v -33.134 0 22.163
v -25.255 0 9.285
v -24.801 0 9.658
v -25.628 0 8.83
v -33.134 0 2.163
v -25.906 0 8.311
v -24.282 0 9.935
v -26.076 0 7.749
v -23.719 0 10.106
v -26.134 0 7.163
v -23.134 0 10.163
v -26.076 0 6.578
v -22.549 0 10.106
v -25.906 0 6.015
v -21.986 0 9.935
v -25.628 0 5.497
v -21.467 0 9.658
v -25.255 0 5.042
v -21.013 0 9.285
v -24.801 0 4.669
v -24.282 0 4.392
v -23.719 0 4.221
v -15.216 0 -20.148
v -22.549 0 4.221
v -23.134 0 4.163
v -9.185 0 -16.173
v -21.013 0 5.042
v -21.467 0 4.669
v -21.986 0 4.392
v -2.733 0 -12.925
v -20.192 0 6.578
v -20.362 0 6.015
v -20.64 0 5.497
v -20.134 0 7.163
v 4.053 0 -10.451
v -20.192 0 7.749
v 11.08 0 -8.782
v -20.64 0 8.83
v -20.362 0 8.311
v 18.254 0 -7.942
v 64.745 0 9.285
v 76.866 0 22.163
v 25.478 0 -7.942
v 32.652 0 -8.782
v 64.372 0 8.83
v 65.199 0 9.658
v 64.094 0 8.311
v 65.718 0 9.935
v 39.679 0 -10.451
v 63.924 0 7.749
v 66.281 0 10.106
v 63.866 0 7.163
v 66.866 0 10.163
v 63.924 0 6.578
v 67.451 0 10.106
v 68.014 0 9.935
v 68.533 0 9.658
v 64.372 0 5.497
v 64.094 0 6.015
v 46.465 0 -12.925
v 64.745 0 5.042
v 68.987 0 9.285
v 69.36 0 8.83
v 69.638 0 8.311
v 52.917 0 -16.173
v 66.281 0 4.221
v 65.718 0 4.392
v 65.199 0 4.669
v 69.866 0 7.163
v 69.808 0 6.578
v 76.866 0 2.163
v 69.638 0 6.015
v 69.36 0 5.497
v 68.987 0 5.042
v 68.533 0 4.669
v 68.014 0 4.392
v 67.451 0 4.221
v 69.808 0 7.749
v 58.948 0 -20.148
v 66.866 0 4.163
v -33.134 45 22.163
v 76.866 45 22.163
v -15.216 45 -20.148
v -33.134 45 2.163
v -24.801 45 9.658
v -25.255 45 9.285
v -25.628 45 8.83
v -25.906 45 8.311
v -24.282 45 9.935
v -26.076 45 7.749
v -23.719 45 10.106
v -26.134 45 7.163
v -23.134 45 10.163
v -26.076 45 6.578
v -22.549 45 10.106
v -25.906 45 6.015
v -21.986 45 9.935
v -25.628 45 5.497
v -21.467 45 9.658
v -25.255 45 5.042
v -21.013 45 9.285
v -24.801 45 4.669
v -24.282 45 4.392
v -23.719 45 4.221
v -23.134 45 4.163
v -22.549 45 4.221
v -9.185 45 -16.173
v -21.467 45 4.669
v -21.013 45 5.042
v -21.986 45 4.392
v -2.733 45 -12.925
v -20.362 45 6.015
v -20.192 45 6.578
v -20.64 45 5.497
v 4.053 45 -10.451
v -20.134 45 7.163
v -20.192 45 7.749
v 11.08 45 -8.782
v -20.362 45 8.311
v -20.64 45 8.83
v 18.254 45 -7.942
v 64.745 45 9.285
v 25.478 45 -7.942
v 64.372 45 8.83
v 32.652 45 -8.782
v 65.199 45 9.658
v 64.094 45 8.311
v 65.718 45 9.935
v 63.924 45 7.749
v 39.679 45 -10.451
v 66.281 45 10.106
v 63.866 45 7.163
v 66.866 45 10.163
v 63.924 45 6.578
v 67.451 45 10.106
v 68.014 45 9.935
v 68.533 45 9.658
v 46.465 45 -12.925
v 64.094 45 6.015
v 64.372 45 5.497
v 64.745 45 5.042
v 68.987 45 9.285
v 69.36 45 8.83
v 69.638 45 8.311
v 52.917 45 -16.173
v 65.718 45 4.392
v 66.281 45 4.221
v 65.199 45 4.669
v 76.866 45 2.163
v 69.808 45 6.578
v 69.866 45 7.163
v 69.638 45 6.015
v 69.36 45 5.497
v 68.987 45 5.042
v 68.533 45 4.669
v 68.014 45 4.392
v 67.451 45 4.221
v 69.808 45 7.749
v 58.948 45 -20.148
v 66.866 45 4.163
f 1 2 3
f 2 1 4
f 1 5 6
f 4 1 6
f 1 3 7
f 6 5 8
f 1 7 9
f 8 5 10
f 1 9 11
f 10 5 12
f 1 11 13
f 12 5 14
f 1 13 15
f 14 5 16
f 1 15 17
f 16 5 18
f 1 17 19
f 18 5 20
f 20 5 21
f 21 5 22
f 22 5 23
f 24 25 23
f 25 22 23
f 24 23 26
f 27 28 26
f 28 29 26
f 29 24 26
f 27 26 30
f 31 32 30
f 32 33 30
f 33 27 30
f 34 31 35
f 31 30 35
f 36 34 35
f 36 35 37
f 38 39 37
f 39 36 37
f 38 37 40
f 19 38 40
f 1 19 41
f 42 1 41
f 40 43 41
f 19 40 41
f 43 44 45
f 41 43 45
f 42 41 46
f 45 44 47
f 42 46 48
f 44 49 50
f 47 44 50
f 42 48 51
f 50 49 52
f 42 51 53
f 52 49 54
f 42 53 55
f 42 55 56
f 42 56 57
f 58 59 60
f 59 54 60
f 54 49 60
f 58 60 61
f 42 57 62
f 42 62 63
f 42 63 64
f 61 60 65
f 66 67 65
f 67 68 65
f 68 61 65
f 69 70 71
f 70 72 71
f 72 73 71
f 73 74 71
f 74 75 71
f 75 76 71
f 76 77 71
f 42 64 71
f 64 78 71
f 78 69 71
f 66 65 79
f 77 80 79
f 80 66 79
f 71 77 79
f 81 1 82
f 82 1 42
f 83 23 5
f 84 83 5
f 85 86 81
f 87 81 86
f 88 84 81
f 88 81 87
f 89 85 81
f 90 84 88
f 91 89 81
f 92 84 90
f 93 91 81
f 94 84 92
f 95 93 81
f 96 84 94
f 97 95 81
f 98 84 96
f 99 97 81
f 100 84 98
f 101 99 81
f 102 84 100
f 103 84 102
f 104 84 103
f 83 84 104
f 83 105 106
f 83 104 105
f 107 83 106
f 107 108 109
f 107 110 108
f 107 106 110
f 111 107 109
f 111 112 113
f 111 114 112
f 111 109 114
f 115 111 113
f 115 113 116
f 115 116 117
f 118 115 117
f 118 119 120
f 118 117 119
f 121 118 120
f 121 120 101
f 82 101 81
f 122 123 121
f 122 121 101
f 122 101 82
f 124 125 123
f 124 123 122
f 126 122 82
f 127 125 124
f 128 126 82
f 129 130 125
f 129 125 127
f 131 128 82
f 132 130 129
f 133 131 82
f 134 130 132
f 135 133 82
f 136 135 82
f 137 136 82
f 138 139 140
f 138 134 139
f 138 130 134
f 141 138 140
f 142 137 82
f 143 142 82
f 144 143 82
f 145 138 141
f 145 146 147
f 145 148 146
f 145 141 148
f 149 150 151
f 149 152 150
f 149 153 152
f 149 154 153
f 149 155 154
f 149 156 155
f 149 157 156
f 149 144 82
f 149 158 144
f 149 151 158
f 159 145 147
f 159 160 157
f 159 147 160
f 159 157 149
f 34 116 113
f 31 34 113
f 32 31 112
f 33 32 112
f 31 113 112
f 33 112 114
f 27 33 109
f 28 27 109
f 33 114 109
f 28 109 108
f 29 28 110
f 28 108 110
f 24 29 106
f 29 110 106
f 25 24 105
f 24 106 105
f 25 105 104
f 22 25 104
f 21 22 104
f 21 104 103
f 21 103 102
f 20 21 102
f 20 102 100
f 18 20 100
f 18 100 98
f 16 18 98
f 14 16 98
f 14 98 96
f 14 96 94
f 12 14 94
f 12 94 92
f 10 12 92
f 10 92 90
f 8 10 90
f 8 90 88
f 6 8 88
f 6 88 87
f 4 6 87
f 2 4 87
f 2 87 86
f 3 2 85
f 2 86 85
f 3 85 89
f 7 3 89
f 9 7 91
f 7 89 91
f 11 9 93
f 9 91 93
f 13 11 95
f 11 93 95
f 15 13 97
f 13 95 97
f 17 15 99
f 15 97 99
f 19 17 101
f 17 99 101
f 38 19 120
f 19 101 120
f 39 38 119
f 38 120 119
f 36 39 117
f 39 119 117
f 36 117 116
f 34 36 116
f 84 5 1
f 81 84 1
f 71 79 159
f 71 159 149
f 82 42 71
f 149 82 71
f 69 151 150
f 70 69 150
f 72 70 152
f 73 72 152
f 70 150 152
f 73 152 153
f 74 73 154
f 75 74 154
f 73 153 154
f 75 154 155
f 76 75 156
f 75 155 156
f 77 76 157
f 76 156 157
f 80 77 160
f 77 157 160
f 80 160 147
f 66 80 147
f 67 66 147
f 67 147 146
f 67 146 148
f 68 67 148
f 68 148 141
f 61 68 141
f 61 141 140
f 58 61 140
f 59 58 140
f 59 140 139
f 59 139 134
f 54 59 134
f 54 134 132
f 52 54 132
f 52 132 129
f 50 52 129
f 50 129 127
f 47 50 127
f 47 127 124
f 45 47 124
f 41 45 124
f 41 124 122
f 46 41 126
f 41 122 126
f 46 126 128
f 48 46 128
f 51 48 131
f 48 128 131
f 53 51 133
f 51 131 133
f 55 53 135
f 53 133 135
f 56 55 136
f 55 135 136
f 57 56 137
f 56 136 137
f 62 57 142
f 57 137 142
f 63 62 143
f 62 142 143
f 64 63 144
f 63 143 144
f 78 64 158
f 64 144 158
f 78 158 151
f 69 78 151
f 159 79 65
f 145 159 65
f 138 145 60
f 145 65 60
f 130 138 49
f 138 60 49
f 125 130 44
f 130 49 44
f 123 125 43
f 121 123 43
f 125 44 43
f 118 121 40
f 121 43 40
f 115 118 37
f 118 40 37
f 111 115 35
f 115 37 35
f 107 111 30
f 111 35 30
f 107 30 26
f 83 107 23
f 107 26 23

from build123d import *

# Parameters (mm, degrees)
BOSS_EXTRUDE1_DEPTH = 45
SKETCH2_R           = 3
CUT_EXTRUDE1_DEPTH  = 46
CUT_EXTRUDE3_DEPTH  = 46


with BuildPart() as part:
    # Sketch1 → Boss-Extrude1 (new body)
    with BuildSketch(Plane(origin=(0, 0, 0), x_dir=(1, 0, 0), z_dir=(0, 1, 0))):
        with BuildLine():
            Line((-33.134005589, -22.163352058), (76.865994411, -22.163352058))
            Line((76.865994411, -22.163352058), (76.865994411, -2.163352058))
            Line((76.865994411, -2.163352058), (62.388671822, 22.912106224))
            ThreePointArc((62.388671822, 22.912106224), (21.865994411, 7.836647942), (-18.656683, 22.912106224))
            Line((-18.656683, 22.912106224), (-33.134005589, -2.163352058))
            Line((-33.134005589, -2.163352058), (-33.134005589, -22.163352058))
        make_face()
    extrude(amount=BOSS_EXTRUDE1_DEPTH)

    # Sketch2 → Cut-Extrude1 (cut, through all)
    with BuildSketch(Plane(origin=(0, 45, 0), x_dir=(1, 0, 0), z_dir=(0, 1, 0))):
        with Locations((-23.134005589, -7.163352058)):
            Circle(SKETCH2_R)
        with Locations((66.865994411, -7.163352058)):
            Circle(SKETCH2_R)
    extrude(amount=-CUT_EXTRUDE1_DEPTH, mode=Mode.SUBTRACT)

    # Sketch3 → Cut-Extrude3 (cut, through all)
    with BuildSketch(Plane.XZ):
        Polygon((-12.082515606, -24.049109598), (-33.134005589, 2.163352058), (-36.114163106, -37.146188521), align=None)
        Polygon((79.846151928, -37.146188521), (55.814504429, -24.049109598), (76.865994411, 2.163352058), align=None)
    extrude(amount=-CUT_EXTRUDE3_DEPTH, mode=Mode.SUBTRACT)


solid = part.part
